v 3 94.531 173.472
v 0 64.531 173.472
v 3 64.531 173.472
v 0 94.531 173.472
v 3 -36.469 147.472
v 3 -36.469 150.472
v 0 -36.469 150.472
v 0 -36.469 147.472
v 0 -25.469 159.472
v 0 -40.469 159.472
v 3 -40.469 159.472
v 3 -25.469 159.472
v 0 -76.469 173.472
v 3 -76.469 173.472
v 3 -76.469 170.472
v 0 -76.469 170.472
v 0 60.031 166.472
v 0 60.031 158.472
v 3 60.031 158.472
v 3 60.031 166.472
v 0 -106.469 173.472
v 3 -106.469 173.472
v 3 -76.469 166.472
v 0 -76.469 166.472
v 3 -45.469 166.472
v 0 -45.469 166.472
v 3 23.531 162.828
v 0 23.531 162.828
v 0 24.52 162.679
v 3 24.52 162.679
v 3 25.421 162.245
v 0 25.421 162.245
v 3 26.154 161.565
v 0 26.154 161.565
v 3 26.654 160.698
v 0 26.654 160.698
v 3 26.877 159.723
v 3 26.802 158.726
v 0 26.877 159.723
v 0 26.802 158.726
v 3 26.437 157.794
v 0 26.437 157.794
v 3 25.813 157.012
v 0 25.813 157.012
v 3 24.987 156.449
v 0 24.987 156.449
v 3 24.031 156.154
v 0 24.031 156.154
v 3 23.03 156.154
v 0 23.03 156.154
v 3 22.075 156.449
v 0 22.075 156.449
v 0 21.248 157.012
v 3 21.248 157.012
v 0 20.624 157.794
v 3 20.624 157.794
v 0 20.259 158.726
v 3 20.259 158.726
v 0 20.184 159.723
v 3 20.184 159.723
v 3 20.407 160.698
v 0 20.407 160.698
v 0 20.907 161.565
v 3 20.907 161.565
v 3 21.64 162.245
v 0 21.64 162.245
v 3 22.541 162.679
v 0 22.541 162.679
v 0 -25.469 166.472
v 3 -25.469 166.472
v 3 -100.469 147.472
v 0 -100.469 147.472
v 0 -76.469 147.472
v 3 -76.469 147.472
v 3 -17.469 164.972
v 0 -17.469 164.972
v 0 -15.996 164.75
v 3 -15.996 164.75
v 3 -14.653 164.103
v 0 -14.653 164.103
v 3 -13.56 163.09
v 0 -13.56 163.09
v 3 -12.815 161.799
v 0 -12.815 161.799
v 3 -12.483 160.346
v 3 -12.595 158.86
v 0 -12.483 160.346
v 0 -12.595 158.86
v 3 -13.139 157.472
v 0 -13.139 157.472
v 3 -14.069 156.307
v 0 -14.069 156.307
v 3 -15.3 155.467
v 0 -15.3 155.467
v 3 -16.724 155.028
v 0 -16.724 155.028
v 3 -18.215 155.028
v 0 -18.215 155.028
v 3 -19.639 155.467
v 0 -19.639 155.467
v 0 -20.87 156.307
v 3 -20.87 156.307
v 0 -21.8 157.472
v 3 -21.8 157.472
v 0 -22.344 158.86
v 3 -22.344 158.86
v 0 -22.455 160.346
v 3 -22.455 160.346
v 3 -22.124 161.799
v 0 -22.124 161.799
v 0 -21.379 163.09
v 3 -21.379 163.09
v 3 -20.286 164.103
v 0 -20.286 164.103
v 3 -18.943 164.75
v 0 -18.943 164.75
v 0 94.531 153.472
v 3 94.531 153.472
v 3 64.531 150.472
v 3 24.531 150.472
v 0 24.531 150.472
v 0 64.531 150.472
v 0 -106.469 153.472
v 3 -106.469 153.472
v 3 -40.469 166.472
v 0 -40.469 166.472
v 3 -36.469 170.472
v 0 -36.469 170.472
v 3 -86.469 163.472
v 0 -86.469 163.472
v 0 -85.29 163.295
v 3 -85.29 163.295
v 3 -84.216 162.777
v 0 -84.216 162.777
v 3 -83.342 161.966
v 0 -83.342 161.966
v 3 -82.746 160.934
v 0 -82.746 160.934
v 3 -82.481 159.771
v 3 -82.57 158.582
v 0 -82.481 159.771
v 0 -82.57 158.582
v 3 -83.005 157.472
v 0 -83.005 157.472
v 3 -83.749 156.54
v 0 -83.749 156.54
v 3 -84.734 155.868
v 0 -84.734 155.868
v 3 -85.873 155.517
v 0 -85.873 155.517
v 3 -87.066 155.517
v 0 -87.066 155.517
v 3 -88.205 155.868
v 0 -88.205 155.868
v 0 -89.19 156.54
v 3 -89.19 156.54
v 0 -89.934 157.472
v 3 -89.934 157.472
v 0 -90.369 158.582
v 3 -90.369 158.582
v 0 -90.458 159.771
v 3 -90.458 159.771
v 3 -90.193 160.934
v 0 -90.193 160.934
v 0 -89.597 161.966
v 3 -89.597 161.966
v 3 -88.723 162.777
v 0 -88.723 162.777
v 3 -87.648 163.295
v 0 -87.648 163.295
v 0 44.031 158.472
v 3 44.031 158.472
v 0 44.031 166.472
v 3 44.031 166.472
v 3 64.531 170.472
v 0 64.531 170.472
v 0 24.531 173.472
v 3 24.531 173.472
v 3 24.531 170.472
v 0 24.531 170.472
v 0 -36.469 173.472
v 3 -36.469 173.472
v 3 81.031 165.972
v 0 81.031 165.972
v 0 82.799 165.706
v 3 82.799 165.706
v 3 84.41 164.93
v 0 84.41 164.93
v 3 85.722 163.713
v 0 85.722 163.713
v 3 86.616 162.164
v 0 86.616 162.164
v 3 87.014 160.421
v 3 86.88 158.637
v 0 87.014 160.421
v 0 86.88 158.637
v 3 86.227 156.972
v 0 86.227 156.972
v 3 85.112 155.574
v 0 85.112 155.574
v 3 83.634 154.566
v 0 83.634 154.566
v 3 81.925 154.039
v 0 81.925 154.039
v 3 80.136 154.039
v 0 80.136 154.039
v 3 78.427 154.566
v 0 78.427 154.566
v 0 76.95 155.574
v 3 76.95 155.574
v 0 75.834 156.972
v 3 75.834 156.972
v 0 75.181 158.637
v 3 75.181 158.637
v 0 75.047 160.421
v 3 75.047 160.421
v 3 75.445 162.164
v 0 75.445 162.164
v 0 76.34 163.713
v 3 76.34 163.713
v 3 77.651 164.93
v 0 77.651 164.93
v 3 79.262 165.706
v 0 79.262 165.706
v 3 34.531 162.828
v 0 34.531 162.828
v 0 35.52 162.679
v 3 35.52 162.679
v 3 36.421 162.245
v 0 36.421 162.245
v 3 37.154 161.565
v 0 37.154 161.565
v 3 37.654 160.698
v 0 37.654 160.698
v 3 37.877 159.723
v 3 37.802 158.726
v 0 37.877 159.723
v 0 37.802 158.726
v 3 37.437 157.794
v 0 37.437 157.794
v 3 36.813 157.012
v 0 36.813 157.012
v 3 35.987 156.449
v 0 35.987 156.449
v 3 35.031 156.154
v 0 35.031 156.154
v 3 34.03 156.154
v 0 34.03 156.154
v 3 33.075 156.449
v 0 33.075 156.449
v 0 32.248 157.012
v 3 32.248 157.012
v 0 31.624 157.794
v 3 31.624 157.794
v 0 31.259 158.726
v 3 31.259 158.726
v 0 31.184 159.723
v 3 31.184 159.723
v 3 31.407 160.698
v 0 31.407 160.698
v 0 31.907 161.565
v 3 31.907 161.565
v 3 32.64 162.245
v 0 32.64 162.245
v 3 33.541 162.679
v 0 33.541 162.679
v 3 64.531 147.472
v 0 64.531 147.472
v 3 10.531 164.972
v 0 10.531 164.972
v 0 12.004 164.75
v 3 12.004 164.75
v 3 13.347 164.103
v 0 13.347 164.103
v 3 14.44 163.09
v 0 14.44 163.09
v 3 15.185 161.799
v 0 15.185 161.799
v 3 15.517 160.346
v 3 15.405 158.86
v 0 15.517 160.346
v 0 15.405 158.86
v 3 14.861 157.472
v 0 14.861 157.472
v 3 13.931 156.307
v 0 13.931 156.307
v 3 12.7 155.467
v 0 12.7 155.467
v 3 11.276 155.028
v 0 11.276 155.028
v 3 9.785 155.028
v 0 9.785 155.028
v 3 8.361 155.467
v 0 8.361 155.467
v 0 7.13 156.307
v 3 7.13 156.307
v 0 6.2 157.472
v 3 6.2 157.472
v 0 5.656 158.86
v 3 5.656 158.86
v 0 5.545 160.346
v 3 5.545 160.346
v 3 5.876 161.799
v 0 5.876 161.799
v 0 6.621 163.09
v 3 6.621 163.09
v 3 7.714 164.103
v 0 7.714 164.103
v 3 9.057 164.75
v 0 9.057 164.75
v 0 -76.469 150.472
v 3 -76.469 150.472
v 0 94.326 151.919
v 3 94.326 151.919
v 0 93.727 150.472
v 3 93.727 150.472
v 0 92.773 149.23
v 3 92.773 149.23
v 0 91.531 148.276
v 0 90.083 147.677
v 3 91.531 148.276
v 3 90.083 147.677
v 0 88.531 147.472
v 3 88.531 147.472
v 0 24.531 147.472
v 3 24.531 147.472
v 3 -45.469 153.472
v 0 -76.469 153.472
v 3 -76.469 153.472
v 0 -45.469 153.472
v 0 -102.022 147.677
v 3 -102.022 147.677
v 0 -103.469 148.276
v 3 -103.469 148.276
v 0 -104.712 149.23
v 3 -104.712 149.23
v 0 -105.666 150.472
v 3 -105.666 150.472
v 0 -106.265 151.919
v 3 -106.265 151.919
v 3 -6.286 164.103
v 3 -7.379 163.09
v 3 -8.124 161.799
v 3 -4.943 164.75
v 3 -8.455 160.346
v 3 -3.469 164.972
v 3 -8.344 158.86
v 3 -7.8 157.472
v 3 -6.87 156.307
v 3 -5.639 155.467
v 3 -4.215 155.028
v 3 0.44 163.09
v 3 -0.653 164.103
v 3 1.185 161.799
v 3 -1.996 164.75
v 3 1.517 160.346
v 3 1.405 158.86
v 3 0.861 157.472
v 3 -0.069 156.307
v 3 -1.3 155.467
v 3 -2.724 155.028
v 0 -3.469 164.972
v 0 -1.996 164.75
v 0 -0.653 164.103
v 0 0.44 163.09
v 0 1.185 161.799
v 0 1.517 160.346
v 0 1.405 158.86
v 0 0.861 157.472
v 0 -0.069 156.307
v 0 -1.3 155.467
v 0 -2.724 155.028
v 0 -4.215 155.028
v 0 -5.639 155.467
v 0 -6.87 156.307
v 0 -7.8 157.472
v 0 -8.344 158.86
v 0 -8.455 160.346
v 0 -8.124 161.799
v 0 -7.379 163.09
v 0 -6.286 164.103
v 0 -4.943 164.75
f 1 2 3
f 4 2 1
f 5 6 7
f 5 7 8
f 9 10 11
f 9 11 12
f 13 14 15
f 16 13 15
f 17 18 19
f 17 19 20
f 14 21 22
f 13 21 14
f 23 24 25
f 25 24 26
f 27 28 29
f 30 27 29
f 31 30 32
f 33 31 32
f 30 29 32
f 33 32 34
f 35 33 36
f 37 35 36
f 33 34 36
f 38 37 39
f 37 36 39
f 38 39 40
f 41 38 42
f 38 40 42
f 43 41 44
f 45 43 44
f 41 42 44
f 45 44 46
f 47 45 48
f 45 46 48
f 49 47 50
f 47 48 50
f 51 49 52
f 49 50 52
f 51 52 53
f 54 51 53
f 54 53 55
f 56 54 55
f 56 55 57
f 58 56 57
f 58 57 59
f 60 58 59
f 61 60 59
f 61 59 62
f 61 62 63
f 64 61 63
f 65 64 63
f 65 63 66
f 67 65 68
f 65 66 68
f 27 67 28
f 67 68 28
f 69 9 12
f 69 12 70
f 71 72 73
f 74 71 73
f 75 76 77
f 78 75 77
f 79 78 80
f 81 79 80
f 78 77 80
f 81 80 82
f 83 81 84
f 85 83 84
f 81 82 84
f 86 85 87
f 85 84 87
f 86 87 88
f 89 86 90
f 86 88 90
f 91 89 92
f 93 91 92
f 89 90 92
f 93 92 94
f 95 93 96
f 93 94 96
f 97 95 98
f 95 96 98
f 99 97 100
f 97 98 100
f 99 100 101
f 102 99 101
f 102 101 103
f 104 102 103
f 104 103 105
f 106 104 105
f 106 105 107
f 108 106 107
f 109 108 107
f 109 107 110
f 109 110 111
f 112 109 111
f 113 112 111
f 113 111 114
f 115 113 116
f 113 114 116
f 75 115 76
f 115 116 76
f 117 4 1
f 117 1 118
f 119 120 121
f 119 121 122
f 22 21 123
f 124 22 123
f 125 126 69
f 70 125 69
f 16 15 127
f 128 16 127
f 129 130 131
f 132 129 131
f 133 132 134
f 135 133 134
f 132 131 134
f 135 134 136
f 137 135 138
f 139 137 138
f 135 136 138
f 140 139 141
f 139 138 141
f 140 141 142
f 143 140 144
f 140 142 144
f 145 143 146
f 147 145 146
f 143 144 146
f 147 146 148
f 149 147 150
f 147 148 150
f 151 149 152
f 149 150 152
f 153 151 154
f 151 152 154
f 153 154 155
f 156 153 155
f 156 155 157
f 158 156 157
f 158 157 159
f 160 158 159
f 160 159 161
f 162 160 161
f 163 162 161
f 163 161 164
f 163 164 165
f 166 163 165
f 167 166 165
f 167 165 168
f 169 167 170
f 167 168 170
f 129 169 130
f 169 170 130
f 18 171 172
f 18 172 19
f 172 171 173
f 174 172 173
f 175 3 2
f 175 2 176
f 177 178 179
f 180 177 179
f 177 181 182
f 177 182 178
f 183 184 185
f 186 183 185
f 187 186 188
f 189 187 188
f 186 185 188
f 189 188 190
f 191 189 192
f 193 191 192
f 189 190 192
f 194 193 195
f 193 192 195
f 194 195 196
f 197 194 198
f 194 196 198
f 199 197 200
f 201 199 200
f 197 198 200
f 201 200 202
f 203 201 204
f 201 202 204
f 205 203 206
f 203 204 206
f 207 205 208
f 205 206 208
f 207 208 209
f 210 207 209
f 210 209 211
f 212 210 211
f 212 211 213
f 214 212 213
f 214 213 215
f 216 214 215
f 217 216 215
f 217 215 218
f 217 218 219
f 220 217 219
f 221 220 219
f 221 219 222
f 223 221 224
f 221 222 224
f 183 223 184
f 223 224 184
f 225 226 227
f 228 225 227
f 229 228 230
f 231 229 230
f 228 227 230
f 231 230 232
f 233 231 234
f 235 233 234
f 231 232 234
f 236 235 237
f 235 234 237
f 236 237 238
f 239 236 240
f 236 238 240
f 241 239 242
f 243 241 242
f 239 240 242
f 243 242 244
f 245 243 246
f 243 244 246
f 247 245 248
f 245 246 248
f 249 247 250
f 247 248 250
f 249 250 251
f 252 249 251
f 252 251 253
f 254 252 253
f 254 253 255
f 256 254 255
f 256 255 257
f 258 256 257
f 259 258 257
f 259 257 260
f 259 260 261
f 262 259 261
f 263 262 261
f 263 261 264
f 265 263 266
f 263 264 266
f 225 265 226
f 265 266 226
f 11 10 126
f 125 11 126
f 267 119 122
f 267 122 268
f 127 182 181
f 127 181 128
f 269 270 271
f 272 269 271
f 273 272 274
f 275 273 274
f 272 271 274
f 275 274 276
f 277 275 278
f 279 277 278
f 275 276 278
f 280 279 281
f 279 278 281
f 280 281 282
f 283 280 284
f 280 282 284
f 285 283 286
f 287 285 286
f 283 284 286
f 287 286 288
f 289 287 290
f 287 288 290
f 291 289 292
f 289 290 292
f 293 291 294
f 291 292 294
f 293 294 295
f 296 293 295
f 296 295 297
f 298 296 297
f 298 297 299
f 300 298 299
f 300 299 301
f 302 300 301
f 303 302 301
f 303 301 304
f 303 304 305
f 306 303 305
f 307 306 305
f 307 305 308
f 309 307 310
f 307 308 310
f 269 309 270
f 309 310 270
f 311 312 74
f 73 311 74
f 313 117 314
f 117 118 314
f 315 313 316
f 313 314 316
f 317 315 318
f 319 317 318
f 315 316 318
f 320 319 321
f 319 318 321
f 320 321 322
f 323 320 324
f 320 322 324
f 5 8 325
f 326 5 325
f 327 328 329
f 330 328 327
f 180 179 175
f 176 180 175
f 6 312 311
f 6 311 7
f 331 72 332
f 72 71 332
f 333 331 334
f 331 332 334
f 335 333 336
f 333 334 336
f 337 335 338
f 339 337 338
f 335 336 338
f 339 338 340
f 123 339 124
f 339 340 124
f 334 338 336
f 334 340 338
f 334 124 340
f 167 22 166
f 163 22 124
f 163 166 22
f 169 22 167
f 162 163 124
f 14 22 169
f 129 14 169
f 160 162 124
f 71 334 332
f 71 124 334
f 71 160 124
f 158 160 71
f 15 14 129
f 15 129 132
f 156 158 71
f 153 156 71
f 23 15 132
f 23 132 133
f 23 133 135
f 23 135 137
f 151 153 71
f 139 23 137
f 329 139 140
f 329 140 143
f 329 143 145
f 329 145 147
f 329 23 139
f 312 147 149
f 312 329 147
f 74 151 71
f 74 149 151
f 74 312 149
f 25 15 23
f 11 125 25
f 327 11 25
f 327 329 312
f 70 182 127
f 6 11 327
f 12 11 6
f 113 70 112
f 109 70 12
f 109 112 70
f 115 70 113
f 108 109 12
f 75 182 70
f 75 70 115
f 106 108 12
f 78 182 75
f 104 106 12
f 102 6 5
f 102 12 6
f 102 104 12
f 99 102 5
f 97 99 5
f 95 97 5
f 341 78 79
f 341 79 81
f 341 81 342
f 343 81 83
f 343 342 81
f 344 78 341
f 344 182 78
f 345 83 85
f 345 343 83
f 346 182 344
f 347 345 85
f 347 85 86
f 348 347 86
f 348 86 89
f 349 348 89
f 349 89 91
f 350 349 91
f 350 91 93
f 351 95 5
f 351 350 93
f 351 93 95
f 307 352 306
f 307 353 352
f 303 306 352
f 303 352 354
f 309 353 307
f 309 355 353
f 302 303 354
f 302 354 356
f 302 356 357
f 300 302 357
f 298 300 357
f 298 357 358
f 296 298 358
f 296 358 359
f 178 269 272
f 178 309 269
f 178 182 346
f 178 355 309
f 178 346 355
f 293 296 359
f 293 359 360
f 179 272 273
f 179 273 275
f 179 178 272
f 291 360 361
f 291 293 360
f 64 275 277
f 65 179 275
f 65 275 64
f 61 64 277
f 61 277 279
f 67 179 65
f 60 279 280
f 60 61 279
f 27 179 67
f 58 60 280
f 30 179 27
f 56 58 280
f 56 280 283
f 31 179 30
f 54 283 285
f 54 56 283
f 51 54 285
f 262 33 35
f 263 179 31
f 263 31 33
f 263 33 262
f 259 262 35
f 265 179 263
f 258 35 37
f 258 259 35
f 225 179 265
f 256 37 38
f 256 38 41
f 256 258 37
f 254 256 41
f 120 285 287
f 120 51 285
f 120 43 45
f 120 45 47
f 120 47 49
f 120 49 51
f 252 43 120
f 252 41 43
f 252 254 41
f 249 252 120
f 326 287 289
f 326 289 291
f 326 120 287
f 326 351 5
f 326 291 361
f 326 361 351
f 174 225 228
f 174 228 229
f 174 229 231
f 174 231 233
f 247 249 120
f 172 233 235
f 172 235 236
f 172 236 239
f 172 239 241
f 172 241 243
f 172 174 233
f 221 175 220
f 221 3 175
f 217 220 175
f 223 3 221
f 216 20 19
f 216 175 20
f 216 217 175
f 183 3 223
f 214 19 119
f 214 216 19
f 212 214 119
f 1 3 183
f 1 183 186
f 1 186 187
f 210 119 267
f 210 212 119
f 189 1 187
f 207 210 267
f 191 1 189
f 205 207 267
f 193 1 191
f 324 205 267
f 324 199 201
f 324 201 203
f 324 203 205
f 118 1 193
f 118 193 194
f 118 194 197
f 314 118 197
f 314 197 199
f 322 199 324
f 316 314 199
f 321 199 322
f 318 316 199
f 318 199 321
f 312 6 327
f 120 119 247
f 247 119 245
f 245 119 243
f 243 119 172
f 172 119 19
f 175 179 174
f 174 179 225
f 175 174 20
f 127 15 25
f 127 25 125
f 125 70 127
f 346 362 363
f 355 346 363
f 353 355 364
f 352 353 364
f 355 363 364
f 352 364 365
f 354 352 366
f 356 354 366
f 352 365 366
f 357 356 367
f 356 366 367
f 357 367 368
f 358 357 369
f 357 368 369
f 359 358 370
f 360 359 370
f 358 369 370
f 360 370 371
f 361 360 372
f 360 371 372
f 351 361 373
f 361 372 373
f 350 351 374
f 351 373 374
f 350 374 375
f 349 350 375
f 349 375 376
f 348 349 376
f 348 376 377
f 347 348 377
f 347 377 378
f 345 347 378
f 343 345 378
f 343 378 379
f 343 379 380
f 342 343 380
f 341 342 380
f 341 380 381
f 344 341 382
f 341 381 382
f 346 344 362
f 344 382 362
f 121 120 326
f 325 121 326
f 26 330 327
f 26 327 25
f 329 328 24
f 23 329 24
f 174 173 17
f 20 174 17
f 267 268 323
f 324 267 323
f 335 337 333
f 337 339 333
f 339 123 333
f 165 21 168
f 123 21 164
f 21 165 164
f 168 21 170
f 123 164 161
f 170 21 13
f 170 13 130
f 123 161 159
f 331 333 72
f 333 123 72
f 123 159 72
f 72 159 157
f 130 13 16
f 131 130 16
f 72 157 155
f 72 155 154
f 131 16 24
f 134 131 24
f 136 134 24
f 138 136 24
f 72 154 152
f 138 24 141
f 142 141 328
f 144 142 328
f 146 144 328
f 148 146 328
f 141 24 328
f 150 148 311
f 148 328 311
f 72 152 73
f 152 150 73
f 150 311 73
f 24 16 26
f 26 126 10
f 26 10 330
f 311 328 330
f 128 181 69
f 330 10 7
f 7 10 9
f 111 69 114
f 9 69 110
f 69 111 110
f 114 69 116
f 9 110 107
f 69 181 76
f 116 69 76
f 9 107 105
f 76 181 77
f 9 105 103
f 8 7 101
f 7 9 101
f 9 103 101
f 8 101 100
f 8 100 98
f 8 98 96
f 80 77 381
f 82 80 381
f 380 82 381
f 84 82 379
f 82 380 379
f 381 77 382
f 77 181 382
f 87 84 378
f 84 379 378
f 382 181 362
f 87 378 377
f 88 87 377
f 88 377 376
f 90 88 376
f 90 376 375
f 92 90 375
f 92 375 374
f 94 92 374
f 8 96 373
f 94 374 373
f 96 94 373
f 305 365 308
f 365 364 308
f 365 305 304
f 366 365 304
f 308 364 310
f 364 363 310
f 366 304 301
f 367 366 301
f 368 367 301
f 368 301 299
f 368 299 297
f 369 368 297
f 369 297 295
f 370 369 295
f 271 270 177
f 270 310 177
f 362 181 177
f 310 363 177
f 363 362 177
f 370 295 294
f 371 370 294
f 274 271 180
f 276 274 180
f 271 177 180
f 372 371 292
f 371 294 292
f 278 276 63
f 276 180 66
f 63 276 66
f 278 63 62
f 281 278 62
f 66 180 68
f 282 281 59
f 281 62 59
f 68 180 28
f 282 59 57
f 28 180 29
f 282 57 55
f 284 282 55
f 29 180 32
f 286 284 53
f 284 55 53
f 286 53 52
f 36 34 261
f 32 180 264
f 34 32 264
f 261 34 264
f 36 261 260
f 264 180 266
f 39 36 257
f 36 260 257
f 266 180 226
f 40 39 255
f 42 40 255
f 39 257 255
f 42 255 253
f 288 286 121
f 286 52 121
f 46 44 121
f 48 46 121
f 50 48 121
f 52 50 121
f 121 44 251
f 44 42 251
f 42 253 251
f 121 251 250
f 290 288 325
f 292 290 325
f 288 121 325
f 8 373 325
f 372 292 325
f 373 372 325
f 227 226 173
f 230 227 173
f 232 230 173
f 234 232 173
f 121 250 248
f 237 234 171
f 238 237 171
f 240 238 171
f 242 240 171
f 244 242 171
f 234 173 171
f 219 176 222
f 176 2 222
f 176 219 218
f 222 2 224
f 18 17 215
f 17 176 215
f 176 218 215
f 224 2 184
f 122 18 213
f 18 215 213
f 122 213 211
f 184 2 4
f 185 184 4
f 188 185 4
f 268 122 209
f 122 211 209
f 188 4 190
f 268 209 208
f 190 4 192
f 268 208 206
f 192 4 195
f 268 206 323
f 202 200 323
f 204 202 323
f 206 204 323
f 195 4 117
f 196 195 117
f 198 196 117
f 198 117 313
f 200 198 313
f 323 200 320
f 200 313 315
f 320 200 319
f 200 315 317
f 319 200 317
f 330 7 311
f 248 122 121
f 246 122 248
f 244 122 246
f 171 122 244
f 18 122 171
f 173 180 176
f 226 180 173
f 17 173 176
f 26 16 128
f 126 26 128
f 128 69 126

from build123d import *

# Parameters (mm, degrees)
SKETCH_1_W          = 26
SKETCH_1_H          = 201
EXTRUDE_1_DEPTH     = 3
SKETCH_5_W          = 3
SKETCH_5_H          = 40
CUT_EXTRUDE_1_DEPTH = 3
FILLET_1_R          = 6
FILLET_2_R          = 6
SKETCH_6_R          = 4
SKETCH_6_R_2        = 5
SKETCH_6_R_3        = 3.355744506
SKETCH_6_R_4        = 6
SKETCH_6_W          = 13
SKETCH_6_H          = 31
SKETCH_6_W_2        = 7
SKETCH_6_H_2        = 15
SKETCH_6_W_3        = 8
SKETCH_6_H_3        = 16
CUT_EXTRUDE_2_DEPTH = 3


with BuildPart() as part:
    # 草图1 → 凸台-拉伸1 (new body)
    with BuildSketch(Plane(origin=(0, 0, 0), x_dir=(0, 0, -1), z_dir=(1, 0, 0))):
        with Locations((-160.472227767, -5.969447374)):
            Rectangle(SKETCH_1_W, SKETCH_1_H)
    extrude(amount=EXTRUDE_1_DEPTH)

    # 草图5 → 切除-拉伸1 (cut)
    with BuildSketch(Plane(origin=(3, 0, 0), x_dir=(0, 0, -1), z_dir=(1, 0, 0))):
        with Locations((-148.972227767, 44.530552626)):
            Rectangle(SKETCH_5_W, SKETCH_5_H)
        with Locations((-171.972227767, 44.530552626)):
            Rectangle(SKETCH_5_W, SKETCH_5_H)
        with Locations((-171.972227767, -56.469447374)):
            Rectangle(SKETCH_5_W, SKETCH_5_H)
        with Locations((-148.972227767, -56.469447374)):
            Rectangle(SKETCH_5_W, SKETCH_5_H)
    extrude(amount=-CUT_EXTRUDE_1_DEPTH, mode=Mode.SUBTRACT)

    # 圆角1
    fillet_1_edges = [part.edges().sort_by_distance(p)[0] for p in [
        (1.5, 94.530552626, 147.472227767),
    ]]
    fillet(fillet_1_edges, radius=FILLET_1_R)

    # 圆角2
    fillet_2_edges = [part.edges().sort_by_distance(p)[0] for p in [
        (1.5, -106.469447374, 147.472227767),
    ]]
    fillet(fillet_2_edges, radius=FILLET_2_R)

    # 草图6 → 切除-拉伸2 (cut)
    with BuildSketch(Plane.ZY):
        with Locations((159.472227767, -86.469447374)):
            Circle(SKETCH_6_R)
        with Locations((159.972227767, -17.469447374)):
            Circle(SKETCH_6_R_2)
        with Locations((159.972227767, -3.469447374)):
            Circle(SKETCH_6_R_2)
        with Locations((159.972227767, 10.530552626)):
            Circle(SKETCH_6_R_2)
        with Locations((159.472227767, 23.530552626)):
            Circle(SKETCH_6_R_3)
        with Locations((159.472227767, 34.530552626)):
            Circle(SKETCH_6_R_3)
        with Locations((159.972227767, 81.030552626)):
            Circle(SKETCH_6_R_4)
        with Locations((159.972227767, -60.969447374)):
            Rectangle(SKETCH_6_W, SKETCH_6_H)
        with Locations((162.972227767, -32.969447374)):
            Rectangle(SKETCH_6_W_2, SKETCH_6_H_2)
        with Locations((162.472227767, 52.030552626)):
            Rectangle(SKETCH_6_W_3, SKETCH_6_H_3)
    extrude(amount=-CUT_EXTRUDE_2_DEPTH, mode=Mode.SUBTRACT)


solid = part.part
